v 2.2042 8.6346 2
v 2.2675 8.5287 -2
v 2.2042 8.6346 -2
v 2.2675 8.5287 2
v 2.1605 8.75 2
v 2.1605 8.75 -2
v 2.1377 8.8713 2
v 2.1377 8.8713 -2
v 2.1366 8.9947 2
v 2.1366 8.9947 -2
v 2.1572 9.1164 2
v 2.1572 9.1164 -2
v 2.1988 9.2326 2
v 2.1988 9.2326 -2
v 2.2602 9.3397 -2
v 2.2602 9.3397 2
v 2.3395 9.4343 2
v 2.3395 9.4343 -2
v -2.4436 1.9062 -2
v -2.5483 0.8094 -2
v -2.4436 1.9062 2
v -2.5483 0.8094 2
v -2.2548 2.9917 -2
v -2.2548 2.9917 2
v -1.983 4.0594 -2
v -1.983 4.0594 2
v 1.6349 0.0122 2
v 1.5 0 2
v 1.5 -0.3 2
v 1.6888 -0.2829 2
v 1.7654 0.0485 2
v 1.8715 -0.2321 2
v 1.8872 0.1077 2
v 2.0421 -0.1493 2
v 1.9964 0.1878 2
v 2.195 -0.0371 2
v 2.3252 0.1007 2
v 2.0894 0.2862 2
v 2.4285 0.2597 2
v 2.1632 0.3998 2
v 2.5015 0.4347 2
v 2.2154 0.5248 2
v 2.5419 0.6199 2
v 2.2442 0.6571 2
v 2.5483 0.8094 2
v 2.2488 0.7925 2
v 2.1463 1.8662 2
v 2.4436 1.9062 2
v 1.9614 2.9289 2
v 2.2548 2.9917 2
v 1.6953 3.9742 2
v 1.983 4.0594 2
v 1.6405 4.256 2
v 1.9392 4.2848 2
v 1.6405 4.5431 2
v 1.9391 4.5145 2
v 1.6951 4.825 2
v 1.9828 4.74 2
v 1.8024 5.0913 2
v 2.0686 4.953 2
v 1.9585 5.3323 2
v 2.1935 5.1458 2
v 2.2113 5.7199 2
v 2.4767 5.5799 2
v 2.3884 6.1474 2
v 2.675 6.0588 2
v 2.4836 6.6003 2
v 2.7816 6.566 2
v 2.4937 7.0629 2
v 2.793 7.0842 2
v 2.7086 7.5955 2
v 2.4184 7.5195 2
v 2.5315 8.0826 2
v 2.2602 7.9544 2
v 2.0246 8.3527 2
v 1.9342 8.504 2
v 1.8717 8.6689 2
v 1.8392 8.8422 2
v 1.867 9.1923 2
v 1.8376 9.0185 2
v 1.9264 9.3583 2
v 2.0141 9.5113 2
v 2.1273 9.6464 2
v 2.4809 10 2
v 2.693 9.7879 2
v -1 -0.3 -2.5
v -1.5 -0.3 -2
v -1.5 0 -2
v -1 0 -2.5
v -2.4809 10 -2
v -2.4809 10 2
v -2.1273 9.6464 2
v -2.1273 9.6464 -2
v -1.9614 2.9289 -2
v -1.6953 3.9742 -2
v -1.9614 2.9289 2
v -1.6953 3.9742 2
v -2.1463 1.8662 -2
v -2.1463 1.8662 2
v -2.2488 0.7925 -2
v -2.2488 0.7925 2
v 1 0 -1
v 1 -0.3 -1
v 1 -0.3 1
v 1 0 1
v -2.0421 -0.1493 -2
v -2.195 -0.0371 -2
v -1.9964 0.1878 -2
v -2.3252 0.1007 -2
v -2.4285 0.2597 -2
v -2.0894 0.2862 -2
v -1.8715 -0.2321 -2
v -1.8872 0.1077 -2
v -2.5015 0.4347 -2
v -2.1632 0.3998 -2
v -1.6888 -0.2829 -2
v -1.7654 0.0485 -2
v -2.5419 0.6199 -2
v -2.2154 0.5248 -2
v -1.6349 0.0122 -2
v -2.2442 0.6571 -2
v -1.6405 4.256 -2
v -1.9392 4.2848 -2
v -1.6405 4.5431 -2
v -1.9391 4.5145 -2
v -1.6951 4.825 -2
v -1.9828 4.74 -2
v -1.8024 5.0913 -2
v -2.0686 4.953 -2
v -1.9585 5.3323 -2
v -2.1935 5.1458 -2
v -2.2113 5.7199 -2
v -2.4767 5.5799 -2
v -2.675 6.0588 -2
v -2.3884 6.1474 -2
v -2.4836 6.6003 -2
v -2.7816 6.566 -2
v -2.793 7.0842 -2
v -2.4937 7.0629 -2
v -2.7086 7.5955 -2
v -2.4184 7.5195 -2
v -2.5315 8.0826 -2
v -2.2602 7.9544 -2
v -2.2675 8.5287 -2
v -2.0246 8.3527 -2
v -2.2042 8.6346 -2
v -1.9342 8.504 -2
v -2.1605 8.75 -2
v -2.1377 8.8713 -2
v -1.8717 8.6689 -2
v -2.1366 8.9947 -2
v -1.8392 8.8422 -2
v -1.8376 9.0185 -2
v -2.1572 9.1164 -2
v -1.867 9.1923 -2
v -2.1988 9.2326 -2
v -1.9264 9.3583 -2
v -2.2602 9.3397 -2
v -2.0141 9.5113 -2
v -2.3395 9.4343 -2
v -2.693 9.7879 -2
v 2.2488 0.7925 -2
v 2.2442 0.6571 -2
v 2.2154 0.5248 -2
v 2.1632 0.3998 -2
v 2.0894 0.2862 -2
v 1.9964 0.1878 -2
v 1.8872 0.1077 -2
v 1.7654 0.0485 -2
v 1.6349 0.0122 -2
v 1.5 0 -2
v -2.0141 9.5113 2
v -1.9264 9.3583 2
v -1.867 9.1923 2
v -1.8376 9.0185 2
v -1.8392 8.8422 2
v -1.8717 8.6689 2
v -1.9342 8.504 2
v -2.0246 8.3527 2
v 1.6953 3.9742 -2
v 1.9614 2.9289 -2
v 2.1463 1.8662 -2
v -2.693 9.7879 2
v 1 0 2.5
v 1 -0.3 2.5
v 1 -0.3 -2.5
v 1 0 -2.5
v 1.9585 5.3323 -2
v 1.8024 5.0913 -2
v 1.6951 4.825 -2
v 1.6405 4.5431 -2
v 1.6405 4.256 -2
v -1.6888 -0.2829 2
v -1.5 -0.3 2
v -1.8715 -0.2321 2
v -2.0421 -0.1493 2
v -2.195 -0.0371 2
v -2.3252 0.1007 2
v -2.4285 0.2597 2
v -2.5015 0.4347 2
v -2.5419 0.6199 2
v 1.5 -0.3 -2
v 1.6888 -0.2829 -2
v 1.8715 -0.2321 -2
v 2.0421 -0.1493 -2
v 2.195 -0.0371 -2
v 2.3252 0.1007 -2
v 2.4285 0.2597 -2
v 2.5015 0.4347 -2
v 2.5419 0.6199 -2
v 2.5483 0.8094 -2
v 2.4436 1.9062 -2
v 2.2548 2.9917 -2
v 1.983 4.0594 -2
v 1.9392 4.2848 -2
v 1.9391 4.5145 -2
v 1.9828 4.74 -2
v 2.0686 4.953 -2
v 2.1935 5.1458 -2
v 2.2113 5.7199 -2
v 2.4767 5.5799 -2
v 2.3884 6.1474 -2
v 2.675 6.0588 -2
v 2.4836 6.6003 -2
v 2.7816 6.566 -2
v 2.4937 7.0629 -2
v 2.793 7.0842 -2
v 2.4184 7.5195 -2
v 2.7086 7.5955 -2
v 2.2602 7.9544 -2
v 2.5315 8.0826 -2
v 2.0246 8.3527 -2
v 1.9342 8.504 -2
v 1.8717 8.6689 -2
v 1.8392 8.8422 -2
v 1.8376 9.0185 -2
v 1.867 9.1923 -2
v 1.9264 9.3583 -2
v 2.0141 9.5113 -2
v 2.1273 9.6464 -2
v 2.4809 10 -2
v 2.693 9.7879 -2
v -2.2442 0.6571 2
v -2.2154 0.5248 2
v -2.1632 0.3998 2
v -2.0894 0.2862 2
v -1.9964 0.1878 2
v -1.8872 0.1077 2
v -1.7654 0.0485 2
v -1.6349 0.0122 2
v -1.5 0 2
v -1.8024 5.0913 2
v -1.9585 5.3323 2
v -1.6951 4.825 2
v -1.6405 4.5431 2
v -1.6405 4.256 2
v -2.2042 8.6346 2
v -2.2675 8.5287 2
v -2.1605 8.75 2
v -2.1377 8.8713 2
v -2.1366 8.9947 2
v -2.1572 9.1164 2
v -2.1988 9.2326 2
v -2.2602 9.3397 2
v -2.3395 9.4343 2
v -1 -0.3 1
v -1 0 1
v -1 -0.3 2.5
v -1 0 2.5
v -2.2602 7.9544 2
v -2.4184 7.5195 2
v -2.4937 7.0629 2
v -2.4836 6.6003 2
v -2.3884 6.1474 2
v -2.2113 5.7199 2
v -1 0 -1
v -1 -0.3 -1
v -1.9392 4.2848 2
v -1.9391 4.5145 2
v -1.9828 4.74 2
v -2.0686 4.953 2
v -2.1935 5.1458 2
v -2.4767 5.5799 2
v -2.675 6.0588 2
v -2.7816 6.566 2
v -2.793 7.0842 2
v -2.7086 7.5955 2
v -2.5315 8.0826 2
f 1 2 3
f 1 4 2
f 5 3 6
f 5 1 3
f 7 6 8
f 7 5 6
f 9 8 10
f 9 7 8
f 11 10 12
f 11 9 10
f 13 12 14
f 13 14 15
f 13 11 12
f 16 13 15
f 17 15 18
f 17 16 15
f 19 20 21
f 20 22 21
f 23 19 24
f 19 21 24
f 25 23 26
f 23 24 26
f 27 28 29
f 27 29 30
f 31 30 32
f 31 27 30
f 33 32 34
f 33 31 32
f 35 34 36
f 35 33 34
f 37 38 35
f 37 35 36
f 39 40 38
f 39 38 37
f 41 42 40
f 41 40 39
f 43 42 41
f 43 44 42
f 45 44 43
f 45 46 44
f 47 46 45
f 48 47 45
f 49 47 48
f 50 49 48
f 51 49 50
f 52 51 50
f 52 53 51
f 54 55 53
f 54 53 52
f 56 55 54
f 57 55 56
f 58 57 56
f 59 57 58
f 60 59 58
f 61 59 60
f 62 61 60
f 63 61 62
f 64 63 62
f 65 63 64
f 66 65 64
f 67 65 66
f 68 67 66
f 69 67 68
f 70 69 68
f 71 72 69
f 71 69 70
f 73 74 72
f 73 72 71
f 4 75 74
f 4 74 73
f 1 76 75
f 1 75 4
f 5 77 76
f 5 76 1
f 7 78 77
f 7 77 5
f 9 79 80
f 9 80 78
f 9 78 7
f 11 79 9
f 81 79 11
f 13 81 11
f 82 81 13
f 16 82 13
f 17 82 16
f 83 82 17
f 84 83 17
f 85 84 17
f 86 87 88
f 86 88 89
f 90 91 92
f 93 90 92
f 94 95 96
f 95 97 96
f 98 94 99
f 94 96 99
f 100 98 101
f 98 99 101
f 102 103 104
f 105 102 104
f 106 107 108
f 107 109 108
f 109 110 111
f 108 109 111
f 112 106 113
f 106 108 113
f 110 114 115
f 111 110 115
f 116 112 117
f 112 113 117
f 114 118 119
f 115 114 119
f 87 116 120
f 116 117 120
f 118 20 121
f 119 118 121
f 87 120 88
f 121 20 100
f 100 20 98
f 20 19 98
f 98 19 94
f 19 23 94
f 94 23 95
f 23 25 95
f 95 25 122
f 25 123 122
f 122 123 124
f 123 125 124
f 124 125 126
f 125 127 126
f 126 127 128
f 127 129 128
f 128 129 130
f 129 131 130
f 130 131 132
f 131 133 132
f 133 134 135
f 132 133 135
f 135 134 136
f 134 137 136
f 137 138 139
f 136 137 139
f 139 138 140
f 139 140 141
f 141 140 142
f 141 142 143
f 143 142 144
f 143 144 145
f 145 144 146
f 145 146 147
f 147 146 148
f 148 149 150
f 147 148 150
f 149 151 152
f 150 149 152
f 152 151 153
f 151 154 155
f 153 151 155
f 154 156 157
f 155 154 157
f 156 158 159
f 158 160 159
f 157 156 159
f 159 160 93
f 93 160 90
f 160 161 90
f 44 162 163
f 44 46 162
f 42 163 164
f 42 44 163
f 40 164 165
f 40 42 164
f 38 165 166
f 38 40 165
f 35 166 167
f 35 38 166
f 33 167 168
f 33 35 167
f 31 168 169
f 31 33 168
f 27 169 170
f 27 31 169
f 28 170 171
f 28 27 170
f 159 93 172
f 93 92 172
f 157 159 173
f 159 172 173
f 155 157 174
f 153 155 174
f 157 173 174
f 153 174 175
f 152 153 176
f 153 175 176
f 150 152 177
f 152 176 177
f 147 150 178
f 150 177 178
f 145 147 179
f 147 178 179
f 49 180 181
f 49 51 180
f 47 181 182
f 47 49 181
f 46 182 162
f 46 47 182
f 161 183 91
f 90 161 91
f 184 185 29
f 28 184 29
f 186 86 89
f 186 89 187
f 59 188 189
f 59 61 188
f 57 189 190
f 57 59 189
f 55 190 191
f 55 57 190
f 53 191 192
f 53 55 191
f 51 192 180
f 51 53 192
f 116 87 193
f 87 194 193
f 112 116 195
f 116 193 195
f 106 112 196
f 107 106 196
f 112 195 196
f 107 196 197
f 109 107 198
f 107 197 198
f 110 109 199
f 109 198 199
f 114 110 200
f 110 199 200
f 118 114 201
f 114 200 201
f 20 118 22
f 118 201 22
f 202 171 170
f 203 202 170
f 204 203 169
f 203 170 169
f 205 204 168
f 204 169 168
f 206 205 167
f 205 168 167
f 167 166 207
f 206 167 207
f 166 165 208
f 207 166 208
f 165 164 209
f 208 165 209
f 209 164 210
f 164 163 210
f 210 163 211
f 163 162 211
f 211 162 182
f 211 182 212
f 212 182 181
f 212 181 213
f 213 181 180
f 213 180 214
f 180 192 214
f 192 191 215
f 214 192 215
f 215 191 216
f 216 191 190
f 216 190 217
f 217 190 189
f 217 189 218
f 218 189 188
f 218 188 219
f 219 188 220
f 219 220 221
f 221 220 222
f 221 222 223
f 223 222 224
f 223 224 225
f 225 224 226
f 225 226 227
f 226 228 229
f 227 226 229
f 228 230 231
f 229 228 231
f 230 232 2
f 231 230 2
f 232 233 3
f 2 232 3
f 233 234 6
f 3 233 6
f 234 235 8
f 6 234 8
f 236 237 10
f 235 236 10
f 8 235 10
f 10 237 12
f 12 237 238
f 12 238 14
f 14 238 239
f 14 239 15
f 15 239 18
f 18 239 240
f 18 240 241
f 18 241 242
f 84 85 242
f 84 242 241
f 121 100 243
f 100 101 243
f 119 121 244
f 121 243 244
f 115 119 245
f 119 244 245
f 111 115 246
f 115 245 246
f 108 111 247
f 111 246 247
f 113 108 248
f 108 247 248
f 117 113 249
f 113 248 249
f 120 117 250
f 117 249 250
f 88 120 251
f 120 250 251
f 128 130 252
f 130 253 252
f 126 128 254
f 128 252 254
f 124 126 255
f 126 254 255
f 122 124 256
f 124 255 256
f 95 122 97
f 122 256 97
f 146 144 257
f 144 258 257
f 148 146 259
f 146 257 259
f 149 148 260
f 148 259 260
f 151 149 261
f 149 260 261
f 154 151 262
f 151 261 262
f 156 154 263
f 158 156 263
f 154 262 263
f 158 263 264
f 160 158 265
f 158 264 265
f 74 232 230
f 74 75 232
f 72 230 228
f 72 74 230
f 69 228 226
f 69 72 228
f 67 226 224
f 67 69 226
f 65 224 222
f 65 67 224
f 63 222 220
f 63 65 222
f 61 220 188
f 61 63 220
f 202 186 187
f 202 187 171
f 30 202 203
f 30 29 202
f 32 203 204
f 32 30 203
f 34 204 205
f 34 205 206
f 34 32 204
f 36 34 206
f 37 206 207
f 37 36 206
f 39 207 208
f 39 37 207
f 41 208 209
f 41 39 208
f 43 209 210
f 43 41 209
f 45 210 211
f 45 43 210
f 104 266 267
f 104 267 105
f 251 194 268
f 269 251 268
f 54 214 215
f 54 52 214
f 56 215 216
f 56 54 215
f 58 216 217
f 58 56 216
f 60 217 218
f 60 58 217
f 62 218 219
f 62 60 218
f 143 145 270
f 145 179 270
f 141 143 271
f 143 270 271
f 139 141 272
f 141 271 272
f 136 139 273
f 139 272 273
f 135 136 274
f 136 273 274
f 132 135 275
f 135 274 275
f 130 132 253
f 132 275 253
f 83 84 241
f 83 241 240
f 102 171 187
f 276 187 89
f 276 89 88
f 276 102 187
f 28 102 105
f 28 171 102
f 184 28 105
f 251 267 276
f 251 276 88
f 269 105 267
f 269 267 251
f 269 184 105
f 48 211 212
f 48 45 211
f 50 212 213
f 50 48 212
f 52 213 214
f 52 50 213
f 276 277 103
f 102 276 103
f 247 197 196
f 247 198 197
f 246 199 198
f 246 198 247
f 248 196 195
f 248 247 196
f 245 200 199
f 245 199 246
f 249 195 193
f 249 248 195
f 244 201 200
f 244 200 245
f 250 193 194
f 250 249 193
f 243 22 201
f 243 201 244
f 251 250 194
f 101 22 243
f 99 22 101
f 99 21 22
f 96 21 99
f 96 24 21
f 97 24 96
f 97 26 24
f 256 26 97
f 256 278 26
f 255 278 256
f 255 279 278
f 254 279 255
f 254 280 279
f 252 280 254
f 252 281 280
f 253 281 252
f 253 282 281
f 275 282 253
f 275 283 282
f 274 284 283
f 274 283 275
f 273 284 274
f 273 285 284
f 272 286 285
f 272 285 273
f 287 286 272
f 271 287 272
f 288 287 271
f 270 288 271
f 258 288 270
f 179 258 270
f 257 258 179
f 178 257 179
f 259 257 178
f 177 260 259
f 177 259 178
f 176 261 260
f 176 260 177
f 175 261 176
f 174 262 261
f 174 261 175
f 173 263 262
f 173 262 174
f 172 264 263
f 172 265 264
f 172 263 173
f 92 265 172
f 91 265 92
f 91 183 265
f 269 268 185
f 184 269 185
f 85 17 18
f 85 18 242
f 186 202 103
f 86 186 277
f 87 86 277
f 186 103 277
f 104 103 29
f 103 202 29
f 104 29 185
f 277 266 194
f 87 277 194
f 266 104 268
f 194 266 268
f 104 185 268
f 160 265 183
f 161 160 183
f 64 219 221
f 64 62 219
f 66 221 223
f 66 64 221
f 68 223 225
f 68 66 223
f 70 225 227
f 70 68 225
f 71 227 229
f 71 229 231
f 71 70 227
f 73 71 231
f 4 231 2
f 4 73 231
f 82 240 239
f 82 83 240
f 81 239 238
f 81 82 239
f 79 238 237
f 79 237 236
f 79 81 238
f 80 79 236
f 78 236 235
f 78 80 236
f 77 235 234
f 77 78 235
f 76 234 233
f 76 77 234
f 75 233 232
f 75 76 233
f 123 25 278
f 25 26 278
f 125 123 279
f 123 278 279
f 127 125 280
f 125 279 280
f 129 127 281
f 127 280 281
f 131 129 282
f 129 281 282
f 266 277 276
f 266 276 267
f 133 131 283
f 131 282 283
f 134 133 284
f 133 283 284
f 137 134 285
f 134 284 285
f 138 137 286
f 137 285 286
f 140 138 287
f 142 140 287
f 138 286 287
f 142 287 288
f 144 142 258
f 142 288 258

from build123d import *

# Parameters (mm, degrees)
EXTRUDE_1_DEPTH     = 2
EXTRUDE_1_2_DEPTH   = 0.3
CUT_EXTRUDE_1_REACH = 12.3
SKETCH_3_W          = 2
SKETCH_3_H          = 2


with BuildPart() as part:
    # Эскиз1 → Extrude 1 (new body, symmetric)
    with BuildSketch(Plane.XY):
        with BuildLine():
            Line((-2.480882446, 10), (-2.127329056, 9.646446609))
            ThreePointArc((-2.127329056, 9.646446609), (-1.837573649, 9.0184965), (-2.024597026, 8.352687375))
            ThreePointArc((-2.024597026, 8.352687375), (-2.499401746, 6.831367016), (-1.958507519, 5.332271091))
            ThreePointArc((-1.958507519, 5.332271091), (-1.661010167, 4.685383513), (-1.695318297, 3.974193548))
            ThreePointArc((-1.695318297, 3.974193548), (-2.06411065, 2.399336209), (-2.248797541, 0.79245283))
            ThreePointArc((-2.248797541, 0.79245283), (-2.045132838, 0.234897885), (-1.5, 0))
            Line((-1.5, 0), (0, 0))
            Line((0, 0), (0, -0.3))
            Line((0, -0.3), (-1.5, -0.3))
            ThreePointArc((-1.5, -0.3), (-2.263185974, 0.028857039), (-2.548316557, 0.809433962))
            ThreePointArc((-2.548316557, 0.809433962), (-2.359672091, 2.450750556), (-1.982977044, 4.059354839))
            ThreePointArc((-1.982977044, 4.059354839), (-1.95553054, 4.62830681), (-2.193528422, 5.145816873))
            ThreePointArc((-2.193528422, 5.145816873), (-2.799329956, 6.824804309), (-2.26754867, 8.528683111))
            ThreePointArc((-2.26754867, 8.528683111), (-2.136632306, 8.994749499), (-2.33946109, 9.434314575))
            Line((-2.33946109, 9.434314575), (-2.693014481, 9.787867966))
            Line((-2.693014481, 9.787867966), (-2.480882446, 10))
        make_face()
    extrude_1 = extrude(amount=EXTRUDE_1_DEPTH, both=True)

    # Зеркальное отражение1: Extrude 1 across plane
    add(extrude_1.mirror(Plane(origin=(0, 0, 0), x_dir=(0, 0, 1), z_dir=(1, 0, 0))))

    # Эскиз2 → Extrude 1 2 (add)
    with BuildSketch(Plane.XZ.offset(0.3)):
        Polygon((-1.5, 2), (-1, 2.5), (1, 2.5), (1.5, 2), align=None)
        Polygon((-1.5, -2), (-1, -2.5), (1, -2.5), (1.5, -2), align=None)
    extrude(amount=-EXTRUDE_1_2_DEPTH)

    # Эскиз3 → Вырез-Вытянуть1 (cut, up to next)
    with BuildSketch(Plane.XZ.offset(0.3), mode=Mode.PRIVATE) as cut_extrude_1_sk1:
        Rectangle(SKETCH_3_W, SKETCH_3_H)
    cut_extrude_1_tool1 = extrude(cut_extrude_1_sk1.sketch, amount=-CUT_EXTRUDE_1_REACH, mode=Mode.PRIVATE) & part.part
    add(cut_extrude_1_tool1.solids().sort_by_distance((0, -0.3, 0))[0], mode=Mode.SUBTRACT)


solid = part.part
